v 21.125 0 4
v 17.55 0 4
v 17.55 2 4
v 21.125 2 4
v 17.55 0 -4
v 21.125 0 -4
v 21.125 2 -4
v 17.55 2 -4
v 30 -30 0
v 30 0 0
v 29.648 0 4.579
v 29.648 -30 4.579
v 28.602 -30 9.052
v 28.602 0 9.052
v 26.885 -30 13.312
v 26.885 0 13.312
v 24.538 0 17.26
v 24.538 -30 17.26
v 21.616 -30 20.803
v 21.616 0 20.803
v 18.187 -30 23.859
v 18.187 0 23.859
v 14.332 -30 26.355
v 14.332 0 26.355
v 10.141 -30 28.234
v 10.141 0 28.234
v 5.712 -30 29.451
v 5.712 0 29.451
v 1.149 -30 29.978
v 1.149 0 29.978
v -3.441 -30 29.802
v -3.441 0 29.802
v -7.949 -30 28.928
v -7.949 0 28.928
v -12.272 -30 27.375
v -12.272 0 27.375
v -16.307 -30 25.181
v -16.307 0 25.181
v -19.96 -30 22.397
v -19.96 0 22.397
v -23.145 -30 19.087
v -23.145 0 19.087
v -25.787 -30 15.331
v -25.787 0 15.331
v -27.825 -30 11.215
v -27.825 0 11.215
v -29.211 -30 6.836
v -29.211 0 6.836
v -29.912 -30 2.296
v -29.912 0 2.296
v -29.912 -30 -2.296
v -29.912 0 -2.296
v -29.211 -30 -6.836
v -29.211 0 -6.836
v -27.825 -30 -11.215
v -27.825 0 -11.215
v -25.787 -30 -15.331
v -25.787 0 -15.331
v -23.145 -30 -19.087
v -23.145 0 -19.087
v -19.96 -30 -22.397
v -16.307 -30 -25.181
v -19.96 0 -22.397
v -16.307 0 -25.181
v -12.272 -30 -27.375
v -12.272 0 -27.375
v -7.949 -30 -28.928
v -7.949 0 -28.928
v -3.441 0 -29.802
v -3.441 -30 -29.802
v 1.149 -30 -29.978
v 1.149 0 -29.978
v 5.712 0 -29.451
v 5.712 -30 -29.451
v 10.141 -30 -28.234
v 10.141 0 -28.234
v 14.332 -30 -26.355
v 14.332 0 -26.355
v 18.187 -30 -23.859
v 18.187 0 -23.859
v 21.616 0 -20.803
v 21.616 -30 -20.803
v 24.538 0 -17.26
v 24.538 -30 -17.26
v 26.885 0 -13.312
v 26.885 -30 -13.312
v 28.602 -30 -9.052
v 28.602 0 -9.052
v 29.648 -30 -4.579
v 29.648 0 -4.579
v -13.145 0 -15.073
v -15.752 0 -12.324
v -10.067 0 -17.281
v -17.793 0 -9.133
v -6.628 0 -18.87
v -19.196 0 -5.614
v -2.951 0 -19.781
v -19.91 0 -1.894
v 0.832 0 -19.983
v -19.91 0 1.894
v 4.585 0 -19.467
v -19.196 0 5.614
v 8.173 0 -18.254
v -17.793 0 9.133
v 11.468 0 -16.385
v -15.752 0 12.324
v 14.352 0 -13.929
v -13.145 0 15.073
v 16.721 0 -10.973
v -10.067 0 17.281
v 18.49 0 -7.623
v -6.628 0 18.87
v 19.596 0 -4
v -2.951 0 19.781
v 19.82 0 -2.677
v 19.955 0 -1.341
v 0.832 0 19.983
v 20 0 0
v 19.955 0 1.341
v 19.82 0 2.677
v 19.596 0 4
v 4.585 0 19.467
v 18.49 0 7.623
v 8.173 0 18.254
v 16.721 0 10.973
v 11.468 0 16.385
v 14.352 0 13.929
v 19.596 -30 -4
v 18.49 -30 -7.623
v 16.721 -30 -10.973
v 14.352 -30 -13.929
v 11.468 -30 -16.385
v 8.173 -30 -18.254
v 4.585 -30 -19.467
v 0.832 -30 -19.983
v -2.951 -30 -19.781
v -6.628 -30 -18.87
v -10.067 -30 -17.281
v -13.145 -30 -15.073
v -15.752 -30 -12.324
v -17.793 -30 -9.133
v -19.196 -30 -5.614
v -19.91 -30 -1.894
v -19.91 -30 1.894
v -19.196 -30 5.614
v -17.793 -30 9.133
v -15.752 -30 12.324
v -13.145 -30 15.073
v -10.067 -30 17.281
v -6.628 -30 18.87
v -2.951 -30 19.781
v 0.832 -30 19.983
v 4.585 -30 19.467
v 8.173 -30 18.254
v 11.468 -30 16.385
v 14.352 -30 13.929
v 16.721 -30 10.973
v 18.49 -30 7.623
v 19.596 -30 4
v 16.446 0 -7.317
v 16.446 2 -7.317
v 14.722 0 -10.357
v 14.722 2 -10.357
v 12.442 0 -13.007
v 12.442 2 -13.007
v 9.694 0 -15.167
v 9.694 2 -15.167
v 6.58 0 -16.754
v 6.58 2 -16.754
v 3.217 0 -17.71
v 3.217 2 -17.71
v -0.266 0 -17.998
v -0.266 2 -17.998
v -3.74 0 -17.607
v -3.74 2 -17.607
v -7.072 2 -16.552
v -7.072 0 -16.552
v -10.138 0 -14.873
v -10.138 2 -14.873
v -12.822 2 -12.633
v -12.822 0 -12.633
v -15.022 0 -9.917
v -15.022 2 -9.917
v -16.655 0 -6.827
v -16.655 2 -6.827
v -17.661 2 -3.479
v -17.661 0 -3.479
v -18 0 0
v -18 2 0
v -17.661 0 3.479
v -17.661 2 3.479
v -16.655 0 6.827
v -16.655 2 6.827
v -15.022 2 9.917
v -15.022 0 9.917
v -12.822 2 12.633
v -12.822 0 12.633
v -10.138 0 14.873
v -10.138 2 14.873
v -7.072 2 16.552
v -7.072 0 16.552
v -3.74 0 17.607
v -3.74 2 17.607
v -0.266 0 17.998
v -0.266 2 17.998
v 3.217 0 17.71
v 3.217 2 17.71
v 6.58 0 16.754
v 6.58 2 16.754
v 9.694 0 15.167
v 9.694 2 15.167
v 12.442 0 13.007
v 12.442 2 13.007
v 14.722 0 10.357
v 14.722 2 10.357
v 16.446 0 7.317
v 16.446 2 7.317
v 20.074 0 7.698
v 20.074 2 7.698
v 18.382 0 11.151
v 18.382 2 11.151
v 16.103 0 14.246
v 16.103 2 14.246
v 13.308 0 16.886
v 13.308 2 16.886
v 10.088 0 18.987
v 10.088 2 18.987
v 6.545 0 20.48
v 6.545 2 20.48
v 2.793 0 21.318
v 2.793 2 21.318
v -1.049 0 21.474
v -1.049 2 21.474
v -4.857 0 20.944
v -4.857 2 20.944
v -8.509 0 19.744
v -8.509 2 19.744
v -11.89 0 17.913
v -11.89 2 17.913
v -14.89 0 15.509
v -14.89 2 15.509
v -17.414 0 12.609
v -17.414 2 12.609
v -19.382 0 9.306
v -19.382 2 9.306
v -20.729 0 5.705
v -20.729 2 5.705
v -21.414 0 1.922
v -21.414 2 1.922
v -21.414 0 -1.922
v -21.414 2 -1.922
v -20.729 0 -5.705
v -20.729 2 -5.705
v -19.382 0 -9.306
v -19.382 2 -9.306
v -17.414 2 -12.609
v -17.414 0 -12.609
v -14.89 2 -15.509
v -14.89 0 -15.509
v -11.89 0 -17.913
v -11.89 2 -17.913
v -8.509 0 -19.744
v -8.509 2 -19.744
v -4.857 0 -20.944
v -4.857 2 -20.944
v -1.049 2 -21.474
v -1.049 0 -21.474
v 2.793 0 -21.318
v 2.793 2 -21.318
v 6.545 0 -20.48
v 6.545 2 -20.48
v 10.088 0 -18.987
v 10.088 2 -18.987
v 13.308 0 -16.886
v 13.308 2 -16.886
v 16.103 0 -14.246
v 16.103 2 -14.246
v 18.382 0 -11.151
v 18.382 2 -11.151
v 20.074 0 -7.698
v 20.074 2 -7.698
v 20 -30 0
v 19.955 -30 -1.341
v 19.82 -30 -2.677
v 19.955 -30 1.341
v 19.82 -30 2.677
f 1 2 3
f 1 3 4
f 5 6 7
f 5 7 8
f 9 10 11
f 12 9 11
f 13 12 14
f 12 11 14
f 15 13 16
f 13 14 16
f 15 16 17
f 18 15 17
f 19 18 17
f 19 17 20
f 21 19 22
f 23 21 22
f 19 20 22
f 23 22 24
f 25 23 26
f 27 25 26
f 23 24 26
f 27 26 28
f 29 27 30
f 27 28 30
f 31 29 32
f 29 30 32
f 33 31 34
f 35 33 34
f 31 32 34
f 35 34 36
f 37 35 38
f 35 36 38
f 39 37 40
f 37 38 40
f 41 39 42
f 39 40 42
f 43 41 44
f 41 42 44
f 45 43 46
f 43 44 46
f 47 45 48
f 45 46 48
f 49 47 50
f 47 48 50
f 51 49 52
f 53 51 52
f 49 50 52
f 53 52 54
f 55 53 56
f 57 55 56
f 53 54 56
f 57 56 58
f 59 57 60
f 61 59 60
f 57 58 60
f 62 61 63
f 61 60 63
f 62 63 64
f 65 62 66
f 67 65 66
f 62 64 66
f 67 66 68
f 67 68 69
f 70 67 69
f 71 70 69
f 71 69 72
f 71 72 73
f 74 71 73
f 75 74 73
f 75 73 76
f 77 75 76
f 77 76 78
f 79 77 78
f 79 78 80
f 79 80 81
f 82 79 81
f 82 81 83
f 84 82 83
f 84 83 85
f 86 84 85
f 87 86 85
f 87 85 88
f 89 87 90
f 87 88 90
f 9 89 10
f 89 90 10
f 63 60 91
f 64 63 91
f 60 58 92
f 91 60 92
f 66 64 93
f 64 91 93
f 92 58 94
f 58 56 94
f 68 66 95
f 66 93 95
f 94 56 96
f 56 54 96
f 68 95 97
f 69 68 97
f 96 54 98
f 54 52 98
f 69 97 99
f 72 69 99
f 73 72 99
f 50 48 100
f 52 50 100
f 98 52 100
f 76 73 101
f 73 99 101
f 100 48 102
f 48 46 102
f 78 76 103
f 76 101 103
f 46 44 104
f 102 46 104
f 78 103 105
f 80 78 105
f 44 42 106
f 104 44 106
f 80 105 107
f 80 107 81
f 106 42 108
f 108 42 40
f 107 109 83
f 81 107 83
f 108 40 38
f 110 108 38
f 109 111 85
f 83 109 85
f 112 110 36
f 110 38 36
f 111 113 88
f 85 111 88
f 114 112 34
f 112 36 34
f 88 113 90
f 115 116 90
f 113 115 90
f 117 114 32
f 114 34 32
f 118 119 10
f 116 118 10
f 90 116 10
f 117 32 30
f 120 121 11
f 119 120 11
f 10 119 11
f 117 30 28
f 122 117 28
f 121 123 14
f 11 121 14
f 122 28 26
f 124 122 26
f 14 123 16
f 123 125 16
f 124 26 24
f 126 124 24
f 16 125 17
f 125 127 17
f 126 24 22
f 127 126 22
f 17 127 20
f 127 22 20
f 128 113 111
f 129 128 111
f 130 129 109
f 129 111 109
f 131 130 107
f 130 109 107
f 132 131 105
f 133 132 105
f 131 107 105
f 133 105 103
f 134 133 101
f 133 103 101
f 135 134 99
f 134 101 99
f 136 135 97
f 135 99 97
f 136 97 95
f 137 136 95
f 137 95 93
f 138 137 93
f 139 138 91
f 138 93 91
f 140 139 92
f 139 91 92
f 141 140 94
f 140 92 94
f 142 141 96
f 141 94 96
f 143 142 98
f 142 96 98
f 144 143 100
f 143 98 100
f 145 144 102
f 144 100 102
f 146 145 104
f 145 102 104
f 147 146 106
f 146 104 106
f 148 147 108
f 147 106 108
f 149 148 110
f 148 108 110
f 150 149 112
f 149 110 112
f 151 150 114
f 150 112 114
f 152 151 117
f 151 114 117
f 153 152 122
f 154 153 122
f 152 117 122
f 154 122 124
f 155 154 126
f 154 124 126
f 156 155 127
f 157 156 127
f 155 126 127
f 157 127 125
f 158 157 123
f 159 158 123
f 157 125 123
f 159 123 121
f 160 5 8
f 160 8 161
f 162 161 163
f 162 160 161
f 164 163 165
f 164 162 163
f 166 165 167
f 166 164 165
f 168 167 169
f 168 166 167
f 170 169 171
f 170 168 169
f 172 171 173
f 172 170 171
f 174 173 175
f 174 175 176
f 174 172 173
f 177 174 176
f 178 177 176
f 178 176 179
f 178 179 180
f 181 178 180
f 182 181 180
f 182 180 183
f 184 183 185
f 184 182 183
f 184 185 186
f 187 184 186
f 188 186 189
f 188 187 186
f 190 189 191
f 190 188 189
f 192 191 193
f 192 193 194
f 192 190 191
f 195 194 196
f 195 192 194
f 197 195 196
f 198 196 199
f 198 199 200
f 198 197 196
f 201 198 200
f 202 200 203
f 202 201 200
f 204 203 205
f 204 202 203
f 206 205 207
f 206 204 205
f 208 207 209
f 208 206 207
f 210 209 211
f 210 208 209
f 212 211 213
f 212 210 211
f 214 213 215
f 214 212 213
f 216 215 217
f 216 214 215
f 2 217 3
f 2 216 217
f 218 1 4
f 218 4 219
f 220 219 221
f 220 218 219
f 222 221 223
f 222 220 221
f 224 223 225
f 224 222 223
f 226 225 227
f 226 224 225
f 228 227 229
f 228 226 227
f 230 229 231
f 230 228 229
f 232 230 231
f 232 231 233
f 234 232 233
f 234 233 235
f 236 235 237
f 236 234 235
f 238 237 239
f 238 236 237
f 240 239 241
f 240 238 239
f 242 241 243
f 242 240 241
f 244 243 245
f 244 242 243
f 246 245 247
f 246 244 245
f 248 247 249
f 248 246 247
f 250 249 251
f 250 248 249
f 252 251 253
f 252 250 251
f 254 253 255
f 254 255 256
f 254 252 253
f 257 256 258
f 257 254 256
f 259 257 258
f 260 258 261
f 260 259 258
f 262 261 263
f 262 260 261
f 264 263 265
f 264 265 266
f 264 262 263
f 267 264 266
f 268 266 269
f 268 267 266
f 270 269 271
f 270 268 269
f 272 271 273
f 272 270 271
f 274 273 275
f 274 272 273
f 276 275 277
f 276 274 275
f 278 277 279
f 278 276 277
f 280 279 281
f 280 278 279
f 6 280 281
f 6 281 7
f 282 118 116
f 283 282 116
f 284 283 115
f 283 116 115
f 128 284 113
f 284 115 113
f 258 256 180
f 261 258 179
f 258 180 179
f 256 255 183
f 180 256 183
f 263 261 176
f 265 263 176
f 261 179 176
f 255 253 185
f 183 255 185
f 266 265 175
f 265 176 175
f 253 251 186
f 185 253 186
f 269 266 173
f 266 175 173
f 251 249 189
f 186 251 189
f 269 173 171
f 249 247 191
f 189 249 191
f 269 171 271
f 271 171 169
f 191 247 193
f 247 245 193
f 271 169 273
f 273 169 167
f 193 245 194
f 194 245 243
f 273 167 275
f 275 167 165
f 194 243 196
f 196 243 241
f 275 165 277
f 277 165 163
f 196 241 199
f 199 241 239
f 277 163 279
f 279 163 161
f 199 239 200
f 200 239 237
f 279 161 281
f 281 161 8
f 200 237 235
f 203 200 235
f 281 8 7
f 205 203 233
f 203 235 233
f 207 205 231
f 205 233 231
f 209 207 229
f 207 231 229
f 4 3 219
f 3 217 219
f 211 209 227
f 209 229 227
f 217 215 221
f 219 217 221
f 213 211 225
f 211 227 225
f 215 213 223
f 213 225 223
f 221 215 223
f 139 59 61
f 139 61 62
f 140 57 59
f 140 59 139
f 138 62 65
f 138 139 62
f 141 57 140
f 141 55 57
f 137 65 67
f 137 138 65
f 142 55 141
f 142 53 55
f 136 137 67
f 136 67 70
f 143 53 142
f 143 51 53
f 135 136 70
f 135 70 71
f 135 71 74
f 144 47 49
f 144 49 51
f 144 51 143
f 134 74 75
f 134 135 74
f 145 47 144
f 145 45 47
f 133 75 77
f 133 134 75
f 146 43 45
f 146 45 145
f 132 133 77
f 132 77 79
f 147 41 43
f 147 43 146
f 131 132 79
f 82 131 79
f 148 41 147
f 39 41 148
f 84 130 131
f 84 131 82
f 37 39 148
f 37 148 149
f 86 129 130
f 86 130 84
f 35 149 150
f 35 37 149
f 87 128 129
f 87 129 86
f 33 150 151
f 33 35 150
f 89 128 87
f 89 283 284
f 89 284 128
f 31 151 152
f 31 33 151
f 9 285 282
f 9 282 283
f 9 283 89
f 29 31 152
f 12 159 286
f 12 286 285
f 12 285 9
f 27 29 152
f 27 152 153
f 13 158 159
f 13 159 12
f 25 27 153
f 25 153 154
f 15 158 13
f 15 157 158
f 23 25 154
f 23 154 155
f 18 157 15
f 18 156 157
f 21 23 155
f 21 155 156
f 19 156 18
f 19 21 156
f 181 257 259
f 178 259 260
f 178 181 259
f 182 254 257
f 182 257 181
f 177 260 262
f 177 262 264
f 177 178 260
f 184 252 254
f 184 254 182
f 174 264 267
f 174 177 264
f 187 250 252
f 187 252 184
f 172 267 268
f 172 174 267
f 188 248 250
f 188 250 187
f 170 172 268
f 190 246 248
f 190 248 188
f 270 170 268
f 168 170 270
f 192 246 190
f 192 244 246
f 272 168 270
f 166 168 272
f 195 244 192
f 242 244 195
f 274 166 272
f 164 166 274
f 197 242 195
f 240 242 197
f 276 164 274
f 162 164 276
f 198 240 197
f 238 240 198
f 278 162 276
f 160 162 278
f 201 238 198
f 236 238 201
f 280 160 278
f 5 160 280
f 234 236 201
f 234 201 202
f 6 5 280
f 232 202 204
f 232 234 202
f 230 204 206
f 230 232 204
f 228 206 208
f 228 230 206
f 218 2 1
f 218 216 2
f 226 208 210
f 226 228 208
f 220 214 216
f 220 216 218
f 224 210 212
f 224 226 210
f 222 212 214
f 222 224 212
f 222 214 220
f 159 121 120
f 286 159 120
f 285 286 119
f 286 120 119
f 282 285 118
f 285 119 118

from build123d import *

# Parameters (mm, degrees)
F0_R     = 30
F1_DEPTH = 30
F2_DEPTH = 2


with BuildPart() as f1:
    # F0 (on Front) → F1 (new body)
    with BuildSketch(Plane.XZ):
        Circle(F0_R)
        with BuildLine():
            ThreePointArc((21.1246301743, -4), (-21.5, 0), (21.1246301743, 4))
            ThreePointArc((21.1246301743, 4), (21.4059518446, 2.0087871033), (21.5, 0))
            ThreePointArc((21.5, 0), (21.4059518446, -2.0087871033), (21.1246301743, -4))
        make_face(mode=Mode.SUBTRACT)
        with BuildLine():
            ThreePointArc((19.5959179423, -4), (-20, 0), (19.5959179423, 4))
            Line((19.5959179423, 4), (21.1246301743, 4))
            ThreePointArc((21.1246301743, 4), (-21.5, 0), (21.1246301743, -4))
            Line((21.1246301743, -4), (19.5959179423, -4))
        make_face()
        with BuildLine():
            ThreePointArc((19.5959179423, 4), (19.8987230601, 2.0101792401), (20, 0))
            ThreePointArc((20, 0), (19.8987230601, -2.0101792401), (19.5959179423, -4))
            Line((19.5959179423, -4), (21.1246301743, -4))
            ThreePointArc((21.1246301743, -4), (21.4059518446, -2.0087871033), (21.5, 0))
            ThreePointArc((21.5, 0), (21.4059518446, 2.0087871033), (21.1246301743, 4))
            Line((21.1246301743, 4), (19.5959179423, 4))
        make_face()
    extrude(amount=F1_DEPTH)


with BuildPart() as f2:
    # F0 (on Front) → F2 (new body)
    with BuildSketch(Plane.XZ):
        with BuildLine():
            Line((17.5499287748, 4), (19.5959179423, 4))
            ThreePointArc((19.5959179423, 4), (-20, 0), (19.5959179423, -4))
            Line((19.5959179423, -4), (17.5499287748, -4))
            ThreePointArc((17.5499287748, -4), (-18, 0), (17.5499287748, 4))
        make_face()
        with BuildLine():
            ThreePointArc((19.5959179423, -4), (-20, 0), (19.5959179423, 4))
            Line((19.5959179423, 4), (21.1246301743, 4))
            ThreePointArc((21.1246301743, 4), (-21.5, 0), (21.1246301743, -4))
            Line((21.1246301743, -4), (19.5959179423, -4))
        make_face()
    extrude(amount=-F2_DEPTH)


solid = Compound([f1.part, f2.part])
